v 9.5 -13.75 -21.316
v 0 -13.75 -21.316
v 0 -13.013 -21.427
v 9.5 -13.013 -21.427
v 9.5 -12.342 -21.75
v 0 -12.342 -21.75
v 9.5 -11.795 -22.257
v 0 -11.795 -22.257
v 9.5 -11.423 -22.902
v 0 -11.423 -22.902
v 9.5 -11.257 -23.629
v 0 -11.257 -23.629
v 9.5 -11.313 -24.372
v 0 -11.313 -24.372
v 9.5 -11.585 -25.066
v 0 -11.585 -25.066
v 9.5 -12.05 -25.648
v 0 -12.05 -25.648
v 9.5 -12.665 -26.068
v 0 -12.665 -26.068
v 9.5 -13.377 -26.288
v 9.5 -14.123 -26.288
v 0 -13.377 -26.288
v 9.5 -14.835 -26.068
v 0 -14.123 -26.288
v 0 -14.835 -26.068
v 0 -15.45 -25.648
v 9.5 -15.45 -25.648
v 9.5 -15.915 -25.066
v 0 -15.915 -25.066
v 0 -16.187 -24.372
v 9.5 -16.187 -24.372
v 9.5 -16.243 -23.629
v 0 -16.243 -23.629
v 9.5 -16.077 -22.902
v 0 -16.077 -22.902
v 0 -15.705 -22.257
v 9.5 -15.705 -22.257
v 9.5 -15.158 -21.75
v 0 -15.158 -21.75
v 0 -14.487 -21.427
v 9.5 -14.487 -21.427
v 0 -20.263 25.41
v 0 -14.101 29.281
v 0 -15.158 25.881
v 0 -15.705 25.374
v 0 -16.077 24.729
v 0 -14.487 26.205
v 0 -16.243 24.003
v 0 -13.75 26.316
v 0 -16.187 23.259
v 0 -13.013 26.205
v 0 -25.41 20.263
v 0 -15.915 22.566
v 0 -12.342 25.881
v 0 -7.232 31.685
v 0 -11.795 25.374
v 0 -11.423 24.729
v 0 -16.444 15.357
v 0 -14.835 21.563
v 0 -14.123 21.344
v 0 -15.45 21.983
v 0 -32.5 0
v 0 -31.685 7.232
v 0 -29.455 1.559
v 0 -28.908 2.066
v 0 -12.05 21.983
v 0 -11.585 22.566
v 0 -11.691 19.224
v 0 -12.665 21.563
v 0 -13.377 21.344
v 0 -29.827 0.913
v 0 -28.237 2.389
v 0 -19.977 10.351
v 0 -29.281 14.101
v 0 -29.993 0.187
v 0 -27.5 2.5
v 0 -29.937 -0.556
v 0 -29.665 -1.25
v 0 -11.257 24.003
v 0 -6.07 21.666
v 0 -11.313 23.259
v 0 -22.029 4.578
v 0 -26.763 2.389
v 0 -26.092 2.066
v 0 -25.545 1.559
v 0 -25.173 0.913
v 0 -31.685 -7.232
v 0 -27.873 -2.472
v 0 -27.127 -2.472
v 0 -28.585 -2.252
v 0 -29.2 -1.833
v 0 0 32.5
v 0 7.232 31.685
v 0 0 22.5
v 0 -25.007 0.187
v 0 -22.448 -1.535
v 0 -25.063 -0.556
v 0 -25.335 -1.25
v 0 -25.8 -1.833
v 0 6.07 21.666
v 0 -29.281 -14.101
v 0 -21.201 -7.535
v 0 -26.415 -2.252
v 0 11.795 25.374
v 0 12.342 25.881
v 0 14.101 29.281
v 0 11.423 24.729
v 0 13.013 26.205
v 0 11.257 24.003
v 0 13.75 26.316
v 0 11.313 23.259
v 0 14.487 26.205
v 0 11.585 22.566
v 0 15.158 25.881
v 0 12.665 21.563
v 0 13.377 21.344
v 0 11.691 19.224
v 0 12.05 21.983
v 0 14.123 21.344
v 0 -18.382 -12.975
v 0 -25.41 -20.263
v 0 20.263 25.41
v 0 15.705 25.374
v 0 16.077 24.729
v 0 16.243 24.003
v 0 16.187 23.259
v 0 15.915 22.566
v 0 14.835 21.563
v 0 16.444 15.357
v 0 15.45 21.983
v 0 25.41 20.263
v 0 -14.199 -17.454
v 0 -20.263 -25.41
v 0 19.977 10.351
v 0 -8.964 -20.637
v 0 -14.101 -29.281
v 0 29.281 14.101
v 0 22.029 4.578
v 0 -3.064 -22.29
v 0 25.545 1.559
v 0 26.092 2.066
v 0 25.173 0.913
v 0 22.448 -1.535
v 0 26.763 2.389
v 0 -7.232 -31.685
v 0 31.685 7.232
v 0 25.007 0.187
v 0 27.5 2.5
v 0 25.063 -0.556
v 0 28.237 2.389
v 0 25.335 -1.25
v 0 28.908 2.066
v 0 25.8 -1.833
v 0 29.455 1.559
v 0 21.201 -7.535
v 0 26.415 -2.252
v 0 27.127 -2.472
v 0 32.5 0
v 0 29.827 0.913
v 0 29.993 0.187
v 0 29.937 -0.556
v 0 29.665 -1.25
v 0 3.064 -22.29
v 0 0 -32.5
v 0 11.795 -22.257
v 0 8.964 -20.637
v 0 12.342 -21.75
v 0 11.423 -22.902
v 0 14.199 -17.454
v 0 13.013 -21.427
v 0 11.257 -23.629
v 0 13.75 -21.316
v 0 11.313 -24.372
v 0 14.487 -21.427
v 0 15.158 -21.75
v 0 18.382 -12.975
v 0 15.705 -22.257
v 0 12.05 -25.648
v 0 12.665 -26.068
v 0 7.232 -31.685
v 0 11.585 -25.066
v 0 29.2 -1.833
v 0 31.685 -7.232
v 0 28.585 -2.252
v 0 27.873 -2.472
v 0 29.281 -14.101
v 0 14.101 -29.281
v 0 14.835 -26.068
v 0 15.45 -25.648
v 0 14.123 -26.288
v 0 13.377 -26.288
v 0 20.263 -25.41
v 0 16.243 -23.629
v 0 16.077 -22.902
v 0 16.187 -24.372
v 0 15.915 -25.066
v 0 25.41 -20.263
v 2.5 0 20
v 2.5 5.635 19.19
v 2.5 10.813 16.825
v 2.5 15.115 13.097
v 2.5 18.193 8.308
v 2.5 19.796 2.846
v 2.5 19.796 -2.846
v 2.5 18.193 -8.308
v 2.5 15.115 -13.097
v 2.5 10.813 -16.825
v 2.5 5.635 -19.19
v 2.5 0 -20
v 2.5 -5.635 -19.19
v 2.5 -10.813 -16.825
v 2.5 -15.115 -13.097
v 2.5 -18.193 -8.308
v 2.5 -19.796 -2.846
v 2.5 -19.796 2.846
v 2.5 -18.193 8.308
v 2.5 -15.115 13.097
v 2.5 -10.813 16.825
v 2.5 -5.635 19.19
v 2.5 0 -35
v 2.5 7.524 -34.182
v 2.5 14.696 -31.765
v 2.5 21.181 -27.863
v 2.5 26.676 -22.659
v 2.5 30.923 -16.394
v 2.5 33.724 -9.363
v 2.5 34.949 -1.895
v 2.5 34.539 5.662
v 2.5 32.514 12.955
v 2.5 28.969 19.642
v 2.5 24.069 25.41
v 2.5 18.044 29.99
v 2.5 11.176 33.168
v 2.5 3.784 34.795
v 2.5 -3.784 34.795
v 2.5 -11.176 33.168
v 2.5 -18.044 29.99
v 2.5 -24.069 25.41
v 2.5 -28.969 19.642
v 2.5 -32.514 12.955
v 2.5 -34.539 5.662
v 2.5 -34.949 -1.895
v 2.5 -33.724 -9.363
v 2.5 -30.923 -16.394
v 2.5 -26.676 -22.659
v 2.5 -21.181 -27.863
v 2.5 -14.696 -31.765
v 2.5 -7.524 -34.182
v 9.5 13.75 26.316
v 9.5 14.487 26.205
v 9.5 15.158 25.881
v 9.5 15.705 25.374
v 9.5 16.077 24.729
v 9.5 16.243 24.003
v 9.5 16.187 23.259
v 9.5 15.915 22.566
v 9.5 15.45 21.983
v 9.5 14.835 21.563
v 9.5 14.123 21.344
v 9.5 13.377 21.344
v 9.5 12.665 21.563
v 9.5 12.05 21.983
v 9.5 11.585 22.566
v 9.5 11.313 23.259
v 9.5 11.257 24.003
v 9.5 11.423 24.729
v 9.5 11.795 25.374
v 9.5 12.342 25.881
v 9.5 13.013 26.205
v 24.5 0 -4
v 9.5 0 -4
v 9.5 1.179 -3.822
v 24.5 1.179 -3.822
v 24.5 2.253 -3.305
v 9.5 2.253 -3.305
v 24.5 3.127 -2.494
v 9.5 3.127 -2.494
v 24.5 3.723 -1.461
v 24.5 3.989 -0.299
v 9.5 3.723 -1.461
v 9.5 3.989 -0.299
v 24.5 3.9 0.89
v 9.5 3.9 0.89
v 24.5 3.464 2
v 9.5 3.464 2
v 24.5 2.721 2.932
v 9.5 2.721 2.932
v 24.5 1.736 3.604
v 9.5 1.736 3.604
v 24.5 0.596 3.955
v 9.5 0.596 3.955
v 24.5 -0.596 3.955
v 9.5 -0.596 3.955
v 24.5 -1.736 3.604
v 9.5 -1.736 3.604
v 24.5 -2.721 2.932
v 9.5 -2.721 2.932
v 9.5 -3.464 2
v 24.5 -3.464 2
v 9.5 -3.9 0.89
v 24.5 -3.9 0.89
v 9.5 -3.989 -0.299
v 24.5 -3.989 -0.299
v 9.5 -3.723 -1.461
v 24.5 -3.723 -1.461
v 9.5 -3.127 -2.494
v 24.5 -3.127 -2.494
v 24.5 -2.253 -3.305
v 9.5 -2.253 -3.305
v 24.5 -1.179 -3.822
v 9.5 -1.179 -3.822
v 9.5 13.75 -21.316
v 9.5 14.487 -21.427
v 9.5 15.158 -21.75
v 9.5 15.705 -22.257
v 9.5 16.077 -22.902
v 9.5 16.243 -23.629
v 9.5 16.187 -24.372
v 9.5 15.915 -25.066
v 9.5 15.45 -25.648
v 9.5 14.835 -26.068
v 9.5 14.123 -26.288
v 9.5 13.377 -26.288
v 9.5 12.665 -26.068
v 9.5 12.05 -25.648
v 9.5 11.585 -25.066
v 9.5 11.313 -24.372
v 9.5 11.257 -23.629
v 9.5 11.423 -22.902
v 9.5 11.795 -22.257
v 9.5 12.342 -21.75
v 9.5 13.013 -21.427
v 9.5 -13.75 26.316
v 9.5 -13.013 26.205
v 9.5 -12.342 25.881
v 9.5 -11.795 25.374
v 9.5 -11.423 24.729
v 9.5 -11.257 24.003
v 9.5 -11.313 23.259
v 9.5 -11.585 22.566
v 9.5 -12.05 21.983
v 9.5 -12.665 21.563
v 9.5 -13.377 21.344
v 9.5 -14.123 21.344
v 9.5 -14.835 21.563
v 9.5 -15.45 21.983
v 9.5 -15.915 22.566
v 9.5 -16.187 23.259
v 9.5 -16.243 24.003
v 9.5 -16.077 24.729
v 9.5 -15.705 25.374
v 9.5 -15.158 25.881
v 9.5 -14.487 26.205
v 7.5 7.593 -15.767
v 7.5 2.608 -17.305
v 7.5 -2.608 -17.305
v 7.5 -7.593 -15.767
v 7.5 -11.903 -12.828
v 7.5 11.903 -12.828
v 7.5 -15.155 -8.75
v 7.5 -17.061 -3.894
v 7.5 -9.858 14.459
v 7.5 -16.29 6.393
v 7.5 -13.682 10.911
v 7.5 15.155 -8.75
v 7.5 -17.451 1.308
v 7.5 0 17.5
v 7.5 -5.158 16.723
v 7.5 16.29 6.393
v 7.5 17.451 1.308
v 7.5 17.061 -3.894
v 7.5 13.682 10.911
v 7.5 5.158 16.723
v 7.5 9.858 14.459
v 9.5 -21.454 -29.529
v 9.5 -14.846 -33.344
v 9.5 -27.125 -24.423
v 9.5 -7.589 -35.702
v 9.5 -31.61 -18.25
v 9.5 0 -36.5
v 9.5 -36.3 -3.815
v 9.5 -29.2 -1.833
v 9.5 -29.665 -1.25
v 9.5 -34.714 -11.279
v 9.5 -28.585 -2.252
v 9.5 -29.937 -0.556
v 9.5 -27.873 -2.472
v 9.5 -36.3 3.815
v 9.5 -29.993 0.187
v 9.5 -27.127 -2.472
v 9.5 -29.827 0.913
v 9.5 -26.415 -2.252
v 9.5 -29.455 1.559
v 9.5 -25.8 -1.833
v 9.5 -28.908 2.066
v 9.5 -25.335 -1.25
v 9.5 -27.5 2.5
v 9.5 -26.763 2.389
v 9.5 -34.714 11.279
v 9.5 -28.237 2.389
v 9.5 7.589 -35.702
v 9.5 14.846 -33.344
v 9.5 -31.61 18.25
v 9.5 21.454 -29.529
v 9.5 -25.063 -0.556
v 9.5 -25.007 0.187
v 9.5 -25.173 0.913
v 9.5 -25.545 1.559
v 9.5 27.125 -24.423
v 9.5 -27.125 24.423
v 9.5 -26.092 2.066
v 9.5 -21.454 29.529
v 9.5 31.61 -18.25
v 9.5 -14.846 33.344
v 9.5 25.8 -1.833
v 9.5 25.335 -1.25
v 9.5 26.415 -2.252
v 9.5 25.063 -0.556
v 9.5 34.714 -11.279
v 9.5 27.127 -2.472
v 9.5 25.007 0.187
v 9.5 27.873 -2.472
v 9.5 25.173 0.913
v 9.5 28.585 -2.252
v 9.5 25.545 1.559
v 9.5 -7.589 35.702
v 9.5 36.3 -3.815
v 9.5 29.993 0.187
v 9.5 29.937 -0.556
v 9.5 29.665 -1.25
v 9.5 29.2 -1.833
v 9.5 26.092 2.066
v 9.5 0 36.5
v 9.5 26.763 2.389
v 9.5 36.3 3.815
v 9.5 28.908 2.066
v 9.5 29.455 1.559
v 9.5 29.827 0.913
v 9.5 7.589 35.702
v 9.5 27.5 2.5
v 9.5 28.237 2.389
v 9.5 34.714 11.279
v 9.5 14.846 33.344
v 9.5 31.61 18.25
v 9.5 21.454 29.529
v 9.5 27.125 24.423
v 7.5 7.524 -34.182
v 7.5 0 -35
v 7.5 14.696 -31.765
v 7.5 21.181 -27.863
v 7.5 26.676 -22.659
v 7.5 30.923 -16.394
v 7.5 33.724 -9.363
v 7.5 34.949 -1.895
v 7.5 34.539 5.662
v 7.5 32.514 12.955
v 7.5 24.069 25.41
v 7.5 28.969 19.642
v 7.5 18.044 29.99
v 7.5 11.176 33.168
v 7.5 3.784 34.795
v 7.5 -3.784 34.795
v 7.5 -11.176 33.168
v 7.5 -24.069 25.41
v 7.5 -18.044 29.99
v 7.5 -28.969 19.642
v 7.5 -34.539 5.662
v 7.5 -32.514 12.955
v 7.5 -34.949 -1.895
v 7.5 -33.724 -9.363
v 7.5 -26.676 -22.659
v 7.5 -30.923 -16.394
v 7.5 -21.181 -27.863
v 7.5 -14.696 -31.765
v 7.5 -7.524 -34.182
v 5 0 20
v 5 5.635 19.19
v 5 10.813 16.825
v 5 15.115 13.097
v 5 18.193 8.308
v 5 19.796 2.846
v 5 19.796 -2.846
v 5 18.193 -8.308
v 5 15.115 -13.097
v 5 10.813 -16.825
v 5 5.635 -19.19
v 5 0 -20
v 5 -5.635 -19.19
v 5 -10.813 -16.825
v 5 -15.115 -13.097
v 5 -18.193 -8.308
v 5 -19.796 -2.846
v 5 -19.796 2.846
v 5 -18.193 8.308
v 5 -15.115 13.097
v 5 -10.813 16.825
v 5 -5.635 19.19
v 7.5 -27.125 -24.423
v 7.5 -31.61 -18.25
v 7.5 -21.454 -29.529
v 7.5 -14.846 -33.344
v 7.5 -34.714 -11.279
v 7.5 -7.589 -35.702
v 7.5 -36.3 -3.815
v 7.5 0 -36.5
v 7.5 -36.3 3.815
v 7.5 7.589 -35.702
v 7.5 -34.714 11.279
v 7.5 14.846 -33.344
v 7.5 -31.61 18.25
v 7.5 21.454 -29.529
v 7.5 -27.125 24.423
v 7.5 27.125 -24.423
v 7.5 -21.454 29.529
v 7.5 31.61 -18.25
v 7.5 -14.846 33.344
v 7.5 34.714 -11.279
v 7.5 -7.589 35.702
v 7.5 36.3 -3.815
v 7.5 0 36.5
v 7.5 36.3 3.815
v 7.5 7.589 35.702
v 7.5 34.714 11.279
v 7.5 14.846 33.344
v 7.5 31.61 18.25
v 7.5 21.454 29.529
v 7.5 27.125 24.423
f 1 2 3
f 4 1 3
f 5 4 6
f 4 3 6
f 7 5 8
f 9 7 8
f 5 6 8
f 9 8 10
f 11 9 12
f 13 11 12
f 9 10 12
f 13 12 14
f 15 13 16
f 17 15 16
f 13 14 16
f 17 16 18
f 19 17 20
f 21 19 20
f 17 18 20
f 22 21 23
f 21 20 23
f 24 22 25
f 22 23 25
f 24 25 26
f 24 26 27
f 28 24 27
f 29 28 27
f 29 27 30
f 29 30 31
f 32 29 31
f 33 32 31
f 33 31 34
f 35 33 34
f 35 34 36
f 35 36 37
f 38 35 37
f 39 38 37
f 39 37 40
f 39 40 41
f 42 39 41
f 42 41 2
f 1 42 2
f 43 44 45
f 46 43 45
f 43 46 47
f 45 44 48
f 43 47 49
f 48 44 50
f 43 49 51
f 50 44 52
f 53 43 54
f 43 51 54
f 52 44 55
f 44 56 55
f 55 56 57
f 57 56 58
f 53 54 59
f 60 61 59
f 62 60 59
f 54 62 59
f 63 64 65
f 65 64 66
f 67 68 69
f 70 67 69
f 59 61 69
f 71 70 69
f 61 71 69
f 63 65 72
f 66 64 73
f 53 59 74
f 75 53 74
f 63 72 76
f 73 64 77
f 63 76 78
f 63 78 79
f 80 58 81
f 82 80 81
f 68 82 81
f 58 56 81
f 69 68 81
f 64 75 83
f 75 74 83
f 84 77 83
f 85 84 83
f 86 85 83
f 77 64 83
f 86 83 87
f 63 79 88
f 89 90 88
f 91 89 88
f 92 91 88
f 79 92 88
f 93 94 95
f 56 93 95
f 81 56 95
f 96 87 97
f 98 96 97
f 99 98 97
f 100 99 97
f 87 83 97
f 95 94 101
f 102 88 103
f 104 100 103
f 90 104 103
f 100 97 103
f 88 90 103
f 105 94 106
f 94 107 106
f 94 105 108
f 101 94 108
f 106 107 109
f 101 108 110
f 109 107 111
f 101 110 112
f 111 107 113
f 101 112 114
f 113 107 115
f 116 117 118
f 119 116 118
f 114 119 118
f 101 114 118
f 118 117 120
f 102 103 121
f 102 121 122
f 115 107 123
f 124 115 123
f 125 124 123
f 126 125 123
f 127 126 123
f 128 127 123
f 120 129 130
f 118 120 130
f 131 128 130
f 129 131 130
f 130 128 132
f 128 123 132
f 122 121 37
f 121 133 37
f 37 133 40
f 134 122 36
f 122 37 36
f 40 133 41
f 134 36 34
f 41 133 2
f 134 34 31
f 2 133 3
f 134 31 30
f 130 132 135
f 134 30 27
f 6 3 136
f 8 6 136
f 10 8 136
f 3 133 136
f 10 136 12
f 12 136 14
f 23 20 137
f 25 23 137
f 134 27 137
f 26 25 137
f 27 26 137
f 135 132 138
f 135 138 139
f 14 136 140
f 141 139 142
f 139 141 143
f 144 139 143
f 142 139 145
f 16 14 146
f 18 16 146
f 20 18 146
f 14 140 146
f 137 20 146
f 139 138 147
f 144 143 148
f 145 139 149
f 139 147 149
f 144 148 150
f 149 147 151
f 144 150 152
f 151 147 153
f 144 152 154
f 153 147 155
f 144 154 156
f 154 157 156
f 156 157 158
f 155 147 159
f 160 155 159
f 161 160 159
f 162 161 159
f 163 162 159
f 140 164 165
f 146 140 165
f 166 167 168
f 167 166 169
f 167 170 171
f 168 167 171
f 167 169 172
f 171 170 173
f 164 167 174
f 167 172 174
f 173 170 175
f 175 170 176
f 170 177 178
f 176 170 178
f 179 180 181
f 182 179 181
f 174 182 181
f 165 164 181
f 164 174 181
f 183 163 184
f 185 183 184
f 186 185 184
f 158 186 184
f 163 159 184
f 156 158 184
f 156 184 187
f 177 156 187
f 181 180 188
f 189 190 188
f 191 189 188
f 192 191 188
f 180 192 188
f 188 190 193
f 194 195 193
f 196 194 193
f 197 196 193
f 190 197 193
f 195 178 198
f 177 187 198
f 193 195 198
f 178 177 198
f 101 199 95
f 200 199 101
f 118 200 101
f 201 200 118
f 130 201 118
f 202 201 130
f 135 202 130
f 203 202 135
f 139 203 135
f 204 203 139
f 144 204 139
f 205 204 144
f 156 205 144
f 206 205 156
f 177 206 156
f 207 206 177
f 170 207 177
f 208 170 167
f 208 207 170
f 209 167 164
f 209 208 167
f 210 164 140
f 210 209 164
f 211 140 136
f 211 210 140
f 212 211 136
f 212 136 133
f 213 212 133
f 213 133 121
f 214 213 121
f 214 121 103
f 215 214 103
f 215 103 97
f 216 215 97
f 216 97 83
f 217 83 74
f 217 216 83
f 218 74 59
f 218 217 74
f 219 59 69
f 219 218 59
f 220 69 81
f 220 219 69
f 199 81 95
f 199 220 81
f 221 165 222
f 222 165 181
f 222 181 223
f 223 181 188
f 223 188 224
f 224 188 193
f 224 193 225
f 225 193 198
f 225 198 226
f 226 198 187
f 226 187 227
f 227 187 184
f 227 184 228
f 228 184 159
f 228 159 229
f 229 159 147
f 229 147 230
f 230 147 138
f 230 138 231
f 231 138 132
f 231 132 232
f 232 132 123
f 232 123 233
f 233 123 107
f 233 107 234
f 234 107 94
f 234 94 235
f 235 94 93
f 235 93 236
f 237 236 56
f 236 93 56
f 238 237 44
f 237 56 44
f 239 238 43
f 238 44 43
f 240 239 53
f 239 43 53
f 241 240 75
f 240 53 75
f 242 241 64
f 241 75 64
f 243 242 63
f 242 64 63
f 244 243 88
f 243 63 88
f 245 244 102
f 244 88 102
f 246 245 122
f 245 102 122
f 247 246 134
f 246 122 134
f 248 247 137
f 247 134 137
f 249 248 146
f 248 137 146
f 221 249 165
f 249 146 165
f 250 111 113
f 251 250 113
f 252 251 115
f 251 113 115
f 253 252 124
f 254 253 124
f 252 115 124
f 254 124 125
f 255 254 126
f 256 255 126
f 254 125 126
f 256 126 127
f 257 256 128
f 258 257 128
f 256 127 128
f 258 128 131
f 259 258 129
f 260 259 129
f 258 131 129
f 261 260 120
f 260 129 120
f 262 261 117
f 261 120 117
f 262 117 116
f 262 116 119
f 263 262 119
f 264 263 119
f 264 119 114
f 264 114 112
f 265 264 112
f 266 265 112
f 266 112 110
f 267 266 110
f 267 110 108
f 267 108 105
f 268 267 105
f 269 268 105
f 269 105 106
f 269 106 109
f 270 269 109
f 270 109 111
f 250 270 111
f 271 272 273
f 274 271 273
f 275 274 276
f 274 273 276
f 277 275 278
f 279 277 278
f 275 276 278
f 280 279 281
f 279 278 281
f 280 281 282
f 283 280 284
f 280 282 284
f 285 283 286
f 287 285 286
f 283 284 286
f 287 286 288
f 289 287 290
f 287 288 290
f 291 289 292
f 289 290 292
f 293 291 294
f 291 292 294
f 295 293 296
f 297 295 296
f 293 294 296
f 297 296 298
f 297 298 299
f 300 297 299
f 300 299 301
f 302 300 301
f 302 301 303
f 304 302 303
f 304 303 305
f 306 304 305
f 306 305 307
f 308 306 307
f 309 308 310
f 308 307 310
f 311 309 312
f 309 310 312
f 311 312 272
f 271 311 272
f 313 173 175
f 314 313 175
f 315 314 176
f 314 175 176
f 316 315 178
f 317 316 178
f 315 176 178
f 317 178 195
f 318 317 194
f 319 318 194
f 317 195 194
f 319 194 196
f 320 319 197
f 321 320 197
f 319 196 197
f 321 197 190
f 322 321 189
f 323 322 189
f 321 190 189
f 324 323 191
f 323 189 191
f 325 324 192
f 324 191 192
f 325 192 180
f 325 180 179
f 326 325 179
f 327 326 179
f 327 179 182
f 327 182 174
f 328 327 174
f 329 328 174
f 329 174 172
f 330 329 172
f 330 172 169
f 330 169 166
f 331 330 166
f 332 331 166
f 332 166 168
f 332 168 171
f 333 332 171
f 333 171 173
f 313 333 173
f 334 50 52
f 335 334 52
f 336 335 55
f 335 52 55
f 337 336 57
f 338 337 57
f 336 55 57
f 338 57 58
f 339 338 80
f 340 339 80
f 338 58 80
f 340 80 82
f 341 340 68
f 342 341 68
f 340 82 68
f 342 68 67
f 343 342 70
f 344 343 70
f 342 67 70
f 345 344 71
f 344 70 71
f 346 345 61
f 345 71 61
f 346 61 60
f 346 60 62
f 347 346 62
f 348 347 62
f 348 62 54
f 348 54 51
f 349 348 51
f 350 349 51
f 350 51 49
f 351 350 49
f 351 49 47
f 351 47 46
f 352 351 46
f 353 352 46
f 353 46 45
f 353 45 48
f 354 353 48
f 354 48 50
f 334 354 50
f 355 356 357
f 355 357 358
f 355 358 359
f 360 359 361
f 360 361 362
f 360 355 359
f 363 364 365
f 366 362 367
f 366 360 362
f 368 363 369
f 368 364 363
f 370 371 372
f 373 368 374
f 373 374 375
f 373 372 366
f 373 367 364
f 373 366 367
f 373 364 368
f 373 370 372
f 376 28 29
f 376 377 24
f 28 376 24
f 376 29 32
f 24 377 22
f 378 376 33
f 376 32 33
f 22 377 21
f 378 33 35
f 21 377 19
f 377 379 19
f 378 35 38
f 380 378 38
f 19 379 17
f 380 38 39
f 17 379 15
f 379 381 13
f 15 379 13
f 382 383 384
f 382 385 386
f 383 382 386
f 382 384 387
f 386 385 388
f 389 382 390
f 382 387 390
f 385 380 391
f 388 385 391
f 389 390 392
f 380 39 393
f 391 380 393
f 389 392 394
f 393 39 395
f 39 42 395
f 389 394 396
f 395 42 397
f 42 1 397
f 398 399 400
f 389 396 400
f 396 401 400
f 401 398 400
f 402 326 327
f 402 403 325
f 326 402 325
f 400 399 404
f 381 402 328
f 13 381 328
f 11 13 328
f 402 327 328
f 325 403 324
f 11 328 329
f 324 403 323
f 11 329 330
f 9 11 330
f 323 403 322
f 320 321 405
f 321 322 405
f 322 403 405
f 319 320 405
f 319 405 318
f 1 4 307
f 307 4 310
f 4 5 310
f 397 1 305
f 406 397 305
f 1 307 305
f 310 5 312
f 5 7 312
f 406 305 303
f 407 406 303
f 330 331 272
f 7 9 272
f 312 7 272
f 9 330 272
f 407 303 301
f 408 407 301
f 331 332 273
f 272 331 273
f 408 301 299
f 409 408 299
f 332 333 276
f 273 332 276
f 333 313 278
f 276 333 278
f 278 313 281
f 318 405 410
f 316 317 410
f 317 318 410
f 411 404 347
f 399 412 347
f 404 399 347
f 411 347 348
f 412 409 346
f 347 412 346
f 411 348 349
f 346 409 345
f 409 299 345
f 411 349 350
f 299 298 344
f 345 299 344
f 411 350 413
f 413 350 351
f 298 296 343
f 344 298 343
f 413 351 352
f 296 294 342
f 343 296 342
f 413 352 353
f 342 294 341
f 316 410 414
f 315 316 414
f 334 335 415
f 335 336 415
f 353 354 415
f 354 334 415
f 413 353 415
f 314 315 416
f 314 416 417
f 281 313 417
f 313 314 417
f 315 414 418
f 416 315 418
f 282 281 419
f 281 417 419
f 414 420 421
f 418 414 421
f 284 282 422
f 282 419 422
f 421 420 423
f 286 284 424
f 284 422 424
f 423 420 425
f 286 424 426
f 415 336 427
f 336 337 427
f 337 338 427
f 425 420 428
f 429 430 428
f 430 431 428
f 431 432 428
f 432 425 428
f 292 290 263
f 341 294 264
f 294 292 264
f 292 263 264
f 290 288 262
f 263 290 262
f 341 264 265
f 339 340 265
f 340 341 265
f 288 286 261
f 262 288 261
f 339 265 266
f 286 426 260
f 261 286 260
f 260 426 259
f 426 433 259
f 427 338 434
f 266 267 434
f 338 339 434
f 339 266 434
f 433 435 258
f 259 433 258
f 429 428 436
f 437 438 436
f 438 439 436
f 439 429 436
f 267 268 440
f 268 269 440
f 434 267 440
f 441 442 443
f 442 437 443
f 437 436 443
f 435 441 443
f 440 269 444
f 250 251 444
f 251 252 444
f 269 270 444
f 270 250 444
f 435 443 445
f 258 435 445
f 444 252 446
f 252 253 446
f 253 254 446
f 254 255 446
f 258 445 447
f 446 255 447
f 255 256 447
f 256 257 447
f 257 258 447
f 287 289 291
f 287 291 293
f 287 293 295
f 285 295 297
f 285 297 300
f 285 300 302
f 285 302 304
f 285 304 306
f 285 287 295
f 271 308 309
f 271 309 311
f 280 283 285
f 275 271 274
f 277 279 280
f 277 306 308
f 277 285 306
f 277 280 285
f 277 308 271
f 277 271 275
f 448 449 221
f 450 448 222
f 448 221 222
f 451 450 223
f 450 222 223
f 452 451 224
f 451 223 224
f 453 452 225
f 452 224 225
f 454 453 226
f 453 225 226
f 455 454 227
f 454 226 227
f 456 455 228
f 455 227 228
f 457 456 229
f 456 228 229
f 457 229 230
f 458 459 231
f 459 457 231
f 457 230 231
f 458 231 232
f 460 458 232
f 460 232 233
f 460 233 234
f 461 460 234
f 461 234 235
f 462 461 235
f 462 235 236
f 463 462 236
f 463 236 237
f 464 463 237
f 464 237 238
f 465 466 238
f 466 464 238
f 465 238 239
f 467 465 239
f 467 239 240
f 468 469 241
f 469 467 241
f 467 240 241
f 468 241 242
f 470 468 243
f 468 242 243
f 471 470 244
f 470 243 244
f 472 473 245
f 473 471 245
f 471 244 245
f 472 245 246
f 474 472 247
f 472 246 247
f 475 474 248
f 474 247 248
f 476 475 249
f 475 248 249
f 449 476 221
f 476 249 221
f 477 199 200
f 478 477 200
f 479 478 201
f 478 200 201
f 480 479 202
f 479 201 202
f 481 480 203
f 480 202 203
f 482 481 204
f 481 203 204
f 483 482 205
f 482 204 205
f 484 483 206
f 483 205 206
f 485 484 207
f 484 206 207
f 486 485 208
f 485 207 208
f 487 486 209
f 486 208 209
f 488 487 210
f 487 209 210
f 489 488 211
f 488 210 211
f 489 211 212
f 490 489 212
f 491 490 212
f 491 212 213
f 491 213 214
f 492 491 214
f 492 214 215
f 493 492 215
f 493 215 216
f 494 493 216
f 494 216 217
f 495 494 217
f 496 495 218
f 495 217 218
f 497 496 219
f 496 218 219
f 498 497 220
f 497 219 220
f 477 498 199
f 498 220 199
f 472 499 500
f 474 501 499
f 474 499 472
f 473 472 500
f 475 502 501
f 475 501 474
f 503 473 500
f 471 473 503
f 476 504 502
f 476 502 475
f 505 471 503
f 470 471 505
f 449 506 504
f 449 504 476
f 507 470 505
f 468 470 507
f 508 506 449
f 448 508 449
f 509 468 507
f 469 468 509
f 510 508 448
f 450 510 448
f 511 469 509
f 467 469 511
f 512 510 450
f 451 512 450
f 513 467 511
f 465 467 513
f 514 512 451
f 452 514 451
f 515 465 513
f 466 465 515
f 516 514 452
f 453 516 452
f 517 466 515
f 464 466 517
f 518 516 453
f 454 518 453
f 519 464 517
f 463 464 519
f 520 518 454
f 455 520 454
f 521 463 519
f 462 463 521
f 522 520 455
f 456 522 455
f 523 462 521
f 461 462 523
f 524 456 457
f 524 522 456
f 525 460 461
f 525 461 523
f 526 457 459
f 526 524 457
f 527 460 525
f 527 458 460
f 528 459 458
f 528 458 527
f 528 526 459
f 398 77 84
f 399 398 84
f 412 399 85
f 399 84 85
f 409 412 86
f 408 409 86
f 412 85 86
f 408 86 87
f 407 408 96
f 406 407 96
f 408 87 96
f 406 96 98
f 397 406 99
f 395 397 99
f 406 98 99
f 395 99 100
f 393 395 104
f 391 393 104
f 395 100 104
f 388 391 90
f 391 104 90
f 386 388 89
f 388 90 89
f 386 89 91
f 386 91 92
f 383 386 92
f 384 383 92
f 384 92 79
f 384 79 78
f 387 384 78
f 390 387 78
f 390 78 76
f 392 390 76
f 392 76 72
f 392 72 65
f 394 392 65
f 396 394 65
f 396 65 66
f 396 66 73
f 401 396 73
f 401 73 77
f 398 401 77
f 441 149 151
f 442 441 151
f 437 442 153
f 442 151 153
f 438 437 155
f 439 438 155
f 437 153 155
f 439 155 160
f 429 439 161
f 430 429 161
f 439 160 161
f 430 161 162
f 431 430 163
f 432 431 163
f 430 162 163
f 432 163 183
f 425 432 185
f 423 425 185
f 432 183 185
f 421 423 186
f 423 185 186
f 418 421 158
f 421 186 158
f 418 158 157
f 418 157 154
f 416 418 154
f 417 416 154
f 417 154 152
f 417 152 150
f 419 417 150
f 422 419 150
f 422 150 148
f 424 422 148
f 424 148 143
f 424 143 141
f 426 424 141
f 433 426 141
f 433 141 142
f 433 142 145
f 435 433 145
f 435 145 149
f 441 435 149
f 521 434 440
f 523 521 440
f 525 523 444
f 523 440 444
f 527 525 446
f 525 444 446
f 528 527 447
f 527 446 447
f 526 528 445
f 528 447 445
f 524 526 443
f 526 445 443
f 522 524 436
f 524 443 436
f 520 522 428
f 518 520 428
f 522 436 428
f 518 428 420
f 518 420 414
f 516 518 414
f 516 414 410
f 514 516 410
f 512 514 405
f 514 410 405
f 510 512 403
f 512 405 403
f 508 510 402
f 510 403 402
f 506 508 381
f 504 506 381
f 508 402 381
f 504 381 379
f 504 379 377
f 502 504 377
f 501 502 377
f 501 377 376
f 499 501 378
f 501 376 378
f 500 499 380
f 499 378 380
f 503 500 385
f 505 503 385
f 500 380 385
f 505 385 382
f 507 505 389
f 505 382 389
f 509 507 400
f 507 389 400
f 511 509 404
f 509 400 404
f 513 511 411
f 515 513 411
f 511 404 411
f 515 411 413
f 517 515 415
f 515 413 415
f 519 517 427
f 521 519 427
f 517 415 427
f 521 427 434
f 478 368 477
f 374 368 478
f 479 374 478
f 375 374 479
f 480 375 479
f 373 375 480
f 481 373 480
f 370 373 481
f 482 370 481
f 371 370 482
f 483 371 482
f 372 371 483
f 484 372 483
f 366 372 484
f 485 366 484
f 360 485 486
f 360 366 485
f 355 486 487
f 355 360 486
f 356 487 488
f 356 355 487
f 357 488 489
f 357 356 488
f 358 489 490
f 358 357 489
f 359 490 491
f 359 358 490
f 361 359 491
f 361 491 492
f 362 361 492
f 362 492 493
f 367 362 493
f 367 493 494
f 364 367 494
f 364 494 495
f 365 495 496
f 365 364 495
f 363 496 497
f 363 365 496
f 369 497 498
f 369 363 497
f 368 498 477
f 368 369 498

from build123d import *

# Parameters (mm, degrees)
SKETCH1_R           = 35
BOSS_EXTRUDE1_DEPTH = 9.5
SKETCH2_R           = 4
BOSS_EXTRUDE2_DEPTH = 15
SKETCH3_R           = 36.5
BOSS_EXTRUDE3_DEPTH = 2
SKETCH4_R           = 2.5
CUT_EXTRUDE1_DEPTH  = 17.5
SKETCH5_R           = 20
CUT_EXTRUDE2_DEPTH  = 7.5
CHAMFER1_SIZE       = 2.5


with BuildPart() as part:
    # Sketch1 → Boss-Extrude1 (new body)
    with BuildSketch(Plane(origin=(0, 0, 0), x_dir=(0, 0, -1), z_dir=(1, 0, 0))):
        Circle(SKETCH1_R)
    extrude(amount=BOSS_EXTRUDE1_DEPTH)

    # Sketch2 → Boss-Extrude2 (add)
    with BuildSketch(Plane(origin=(9.5, 0, 0), x_dir=(0, 0, -1), z_dir=(1, 0, 0))):
        Circle(SKETCH2_R)
    extrude(amount=BOSS_EXTRUDE2_DEPTH)

    # Sketch3 → Boss-Extrude3 (add)
    with BuildSketch(Plane.ZY.offset(-9.5)):
        Circle(SKETCH3_R)
    extrude(amount=BOSS_EXTRUDE3_DEPTH)

    # Sketch4 → Cut-Extrude1 (cut)
    with BuildSketch(Plane.ZY):
        with Locations((0, 27.5)):
            Circle(SKETCH4_R)
        with Locations((23.815698604, 13.75)):
            Circle(SKETCH4_R)
        with Locations((23.815698604, -13.75)):
            Circle(SKETCH4_R)
        with Locations((0, -27.5)):
            Circle(SKETCH4_R)
        with Locations((-23.815698604, -13.75)):
            Circle(SKETCH4_R)
        with Locations((-23.815698604, 13.75)):
            Circle(SKETCH4_R)
    extrude(amount=-CUT_EXTRUDE1_DEPTH, mode=Mode.SUBTRACT)

    # Sketch5 → Cut-Extrude2 (cut)
    with BuildSketch(Plane.ZY):
        Circle(SKETCH5_R)
    extrude(amount=-CUT_EXTRUDE2_DEPTH, mode=Mode.SUBTRACT)

    # Chamfer1
    chamfer1_edges = [part.edges().sort_by_distance(p)[0] for p in [
        (0, 0, 35),
        (0, 0, -20),
        (7.5, 0, -20),
    ]]
    chamfer(chamfer1_edges, length=CHAMFER1_SIZE)


solid = part.part
